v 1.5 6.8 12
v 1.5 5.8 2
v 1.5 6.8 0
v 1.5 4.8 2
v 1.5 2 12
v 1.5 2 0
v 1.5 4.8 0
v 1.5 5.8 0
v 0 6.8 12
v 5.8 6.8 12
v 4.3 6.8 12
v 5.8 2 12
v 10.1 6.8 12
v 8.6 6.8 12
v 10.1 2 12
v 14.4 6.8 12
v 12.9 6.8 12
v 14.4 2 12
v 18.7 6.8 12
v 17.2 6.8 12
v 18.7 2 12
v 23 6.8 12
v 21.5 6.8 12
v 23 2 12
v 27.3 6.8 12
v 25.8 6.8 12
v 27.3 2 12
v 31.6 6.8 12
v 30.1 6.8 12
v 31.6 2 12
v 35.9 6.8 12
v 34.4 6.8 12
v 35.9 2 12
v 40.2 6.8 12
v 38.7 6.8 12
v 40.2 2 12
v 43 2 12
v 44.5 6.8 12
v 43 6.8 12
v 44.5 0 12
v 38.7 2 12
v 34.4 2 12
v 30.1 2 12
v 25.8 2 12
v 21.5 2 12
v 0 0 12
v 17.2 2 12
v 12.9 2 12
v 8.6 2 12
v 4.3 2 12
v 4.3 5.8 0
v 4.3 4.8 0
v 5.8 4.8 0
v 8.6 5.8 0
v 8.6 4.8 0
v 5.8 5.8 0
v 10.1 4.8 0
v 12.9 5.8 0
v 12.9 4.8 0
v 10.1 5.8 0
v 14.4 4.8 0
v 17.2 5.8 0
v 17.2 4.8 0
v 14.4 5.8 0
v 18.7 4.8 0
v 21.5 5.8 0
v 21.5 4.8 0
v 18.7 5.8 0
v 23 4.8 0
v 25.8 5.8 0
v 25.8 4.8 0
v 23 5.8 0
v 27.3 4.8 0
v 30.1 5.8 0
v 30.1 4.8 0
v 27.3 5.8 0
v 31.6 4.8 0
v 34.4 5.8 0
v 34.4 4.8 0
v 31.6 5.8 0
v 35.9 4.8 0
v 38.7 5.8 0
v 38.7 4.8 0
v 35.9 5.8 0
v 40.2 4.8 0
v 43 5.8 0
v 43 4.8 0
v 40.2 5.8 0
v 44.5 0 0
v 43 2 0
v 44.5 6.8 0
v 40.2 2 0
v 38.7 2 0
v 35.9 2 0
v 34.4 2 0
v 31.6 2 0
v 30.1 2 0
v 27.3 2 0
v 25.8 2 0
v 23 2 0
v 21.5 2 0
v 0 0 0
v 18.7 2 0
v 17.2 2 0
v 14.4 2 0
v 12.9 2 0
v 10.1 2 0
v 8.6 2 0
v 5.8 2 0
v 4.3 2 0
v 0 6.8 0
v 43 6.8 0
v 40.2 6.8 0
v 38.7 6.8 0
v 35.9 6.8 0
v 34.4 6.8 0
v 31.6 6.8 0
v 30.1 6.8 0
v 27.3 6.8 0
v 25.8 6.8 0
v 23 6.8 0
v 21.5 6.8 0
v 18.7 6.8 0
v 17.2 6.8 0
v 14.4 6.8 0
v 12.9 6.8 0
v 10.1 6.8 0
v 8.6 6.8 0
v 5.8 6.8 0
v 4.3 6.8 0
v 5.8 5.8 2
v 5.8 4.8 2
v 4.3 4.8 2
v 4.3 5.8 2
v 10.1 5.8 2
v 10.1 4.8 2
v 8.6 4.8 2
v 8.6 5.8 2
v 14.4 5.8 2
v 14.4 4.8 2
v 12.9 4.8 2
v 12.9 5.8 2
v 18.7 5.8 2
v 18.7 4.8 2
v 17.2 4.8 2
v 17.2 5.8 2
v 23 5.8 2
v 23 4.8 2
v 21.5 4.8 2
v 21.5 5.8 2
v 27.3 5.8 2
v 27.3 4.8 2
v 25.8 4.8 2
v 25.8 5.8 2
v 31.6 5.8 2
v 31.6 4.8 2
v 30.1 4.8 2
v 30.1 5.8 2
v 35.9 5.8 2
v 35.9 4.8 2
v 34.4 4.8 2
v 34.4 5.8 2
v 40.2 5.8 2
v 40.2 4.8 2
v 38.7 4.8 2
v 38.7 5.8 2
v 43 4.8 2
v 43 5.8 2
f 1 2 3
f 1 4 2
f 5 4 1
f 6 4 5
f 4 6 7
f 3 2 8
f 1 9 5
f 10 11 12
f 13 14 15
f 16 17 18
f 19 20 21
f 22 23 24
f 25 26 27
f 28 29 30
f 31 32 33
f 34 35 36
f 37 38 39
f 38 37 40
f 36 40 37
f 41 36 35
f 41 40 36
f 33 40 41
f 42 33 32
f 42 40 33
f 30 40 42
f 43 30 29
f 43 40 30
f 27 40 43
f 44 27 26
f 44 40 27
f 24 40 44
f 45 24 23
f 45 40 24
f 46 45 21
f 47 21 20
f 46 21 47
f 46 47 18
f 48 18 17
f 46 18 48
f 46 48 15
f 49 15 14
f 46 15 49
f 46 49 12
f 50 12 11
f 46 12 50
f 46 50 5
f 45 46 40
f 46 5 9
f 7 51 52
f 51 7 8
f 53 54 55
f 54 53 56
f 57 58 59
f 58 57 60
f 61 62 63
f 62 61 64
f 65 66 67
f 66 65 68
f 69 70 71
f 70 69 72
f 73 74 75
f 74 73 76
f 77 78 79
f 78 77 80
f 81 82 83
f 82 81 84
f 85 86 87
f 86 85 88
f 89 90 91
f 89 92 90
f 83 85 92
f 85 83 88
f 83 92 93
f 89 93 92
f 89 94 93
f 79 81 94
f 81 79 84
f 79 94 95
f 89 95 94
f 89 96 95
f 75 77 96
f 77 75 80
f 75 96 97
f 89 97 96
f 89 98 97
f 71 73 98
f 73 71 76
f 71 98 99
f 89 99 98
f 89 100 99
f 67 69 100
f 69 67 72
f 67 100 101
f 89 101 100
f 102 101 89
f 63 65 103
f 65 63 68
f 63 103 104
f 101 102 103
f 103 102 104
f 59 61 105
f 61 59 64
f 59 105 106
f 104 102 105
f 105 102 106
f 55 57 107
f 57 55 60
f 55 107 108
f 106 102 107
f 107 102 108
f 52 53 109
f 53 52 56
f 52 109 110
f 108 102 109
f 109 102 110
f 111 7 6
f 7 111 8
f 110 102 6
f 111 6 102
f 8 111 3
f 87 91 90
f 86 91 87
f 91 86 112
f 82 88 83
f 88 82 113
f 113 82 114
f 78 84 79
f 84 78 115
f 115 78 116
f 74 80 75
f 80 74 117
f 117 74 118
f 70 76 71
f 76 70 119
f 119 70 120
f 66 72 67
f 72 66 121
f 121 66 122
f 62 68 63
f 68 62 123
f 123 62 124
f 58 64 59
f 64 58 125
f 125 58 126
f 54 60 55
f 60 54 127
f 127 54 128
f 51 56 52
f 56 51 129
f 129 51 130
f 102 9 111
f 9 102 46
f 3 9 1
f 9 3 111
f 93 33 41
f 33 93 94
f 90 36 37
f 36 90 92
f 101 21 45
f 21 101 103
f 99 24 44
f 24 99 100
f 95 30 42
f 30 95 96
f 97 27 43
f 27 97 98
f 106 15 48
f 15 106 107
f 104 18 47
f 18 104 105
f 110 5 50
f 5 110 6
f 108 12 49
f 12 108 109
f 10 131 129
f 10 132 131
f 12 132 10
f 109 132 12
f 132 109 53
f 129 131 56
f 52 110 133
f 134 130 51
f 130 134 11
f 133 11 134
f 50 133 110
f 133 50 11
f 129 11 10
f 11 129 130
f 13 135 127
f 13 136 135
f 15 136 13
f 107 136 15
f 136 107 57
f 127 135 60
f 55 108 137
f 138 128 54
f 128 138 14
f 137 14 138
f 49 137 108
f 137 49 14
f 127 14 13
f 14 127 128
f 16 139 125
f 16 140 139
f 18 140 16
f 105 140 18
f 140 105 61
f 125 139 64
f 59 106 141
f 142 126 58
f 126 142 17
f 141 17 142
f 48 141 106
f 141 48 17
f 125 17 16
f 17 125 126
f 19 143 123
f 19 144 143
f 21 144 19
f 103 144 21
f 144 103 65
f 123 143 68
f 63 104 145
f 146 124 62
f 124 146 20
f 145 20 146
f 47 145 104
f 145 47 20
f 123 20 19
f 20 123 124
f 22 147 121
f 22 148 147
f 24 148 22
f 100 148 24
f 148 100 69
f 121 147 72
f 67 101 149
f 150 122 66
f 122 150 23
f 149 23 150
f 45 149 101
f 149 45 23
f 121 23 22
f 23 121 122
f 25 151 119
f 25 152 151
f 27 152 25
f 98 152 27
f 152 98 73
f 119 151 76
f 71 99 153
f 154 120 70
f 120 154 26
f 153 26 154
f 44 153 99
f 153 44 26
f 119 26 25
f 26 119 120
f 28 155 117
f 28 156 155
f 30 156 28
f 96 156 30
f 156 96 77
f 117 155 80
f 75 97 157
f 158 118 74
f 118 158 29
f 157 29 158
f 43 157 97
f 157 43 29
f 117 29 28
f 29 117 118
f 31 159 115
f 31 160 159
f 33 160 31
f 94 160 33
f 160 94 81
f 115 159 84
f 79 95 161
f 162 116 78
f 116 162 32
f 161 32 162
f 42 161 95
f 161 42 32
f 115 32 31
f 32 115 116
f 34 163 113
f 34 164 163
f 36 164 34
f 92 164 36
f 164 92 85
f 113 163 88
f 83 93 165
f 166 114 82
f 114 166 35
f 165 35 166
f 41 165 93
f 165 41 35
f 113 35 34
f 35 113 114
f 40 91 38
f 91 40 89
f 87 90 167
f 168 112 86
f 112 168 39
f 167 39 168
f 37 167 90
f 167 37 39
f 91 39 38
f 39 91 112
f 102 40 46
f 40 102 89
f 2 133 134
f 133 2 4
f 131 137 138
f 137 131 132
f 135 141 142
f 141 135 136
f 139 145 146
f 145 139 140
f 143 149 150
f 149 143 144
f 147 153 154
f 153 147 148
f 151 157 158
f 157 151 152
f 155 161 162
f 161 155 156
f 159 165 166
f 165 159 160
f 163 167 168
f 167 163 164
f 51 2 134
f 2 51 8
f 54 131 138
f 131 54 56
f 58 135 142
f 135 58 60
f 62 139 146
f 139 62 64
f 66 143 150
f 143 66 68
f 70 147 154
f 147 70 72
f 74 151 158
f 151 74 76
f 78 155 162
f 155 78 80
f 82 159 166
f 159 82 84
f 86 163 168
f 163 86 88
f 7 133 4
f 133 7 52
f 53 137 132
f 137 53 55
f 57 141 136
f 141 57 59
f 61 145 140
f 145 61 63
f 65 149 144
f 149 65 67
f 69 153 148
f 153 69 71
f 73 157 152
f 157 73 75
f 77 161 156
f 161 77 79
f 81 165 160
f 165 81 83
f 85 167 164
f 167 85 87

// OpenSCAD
// --- Parameters ---
num_slots = 10;          // How many wires to hold
housing_width = 2.8;     // Standard is 2.54mm, we add a gap for fit
housing_depth = 2.8;     // Depth of the plastic connector
wall_thickness = 1.5;    // Thickness of the dividers
rail_height = 12;        // Height of the frame
back_thickness = 2;      // Thickness of the back plate

// --- Calculations ---
slot_pitch = housing_width + wall_thickness;
total_width = (slot_pitch * num_slots) + wall_thickness;

// --- The Model ---
union() {
    // 1. The Back Plate
    cube([total_width, back_thickness, rail_height]);

    // 2. The Teeth (Dividers)
    for (i = [0 : num_slots]) {
        translate([i * slot_pitch, back_thickness, 0])
            cube([wall_thickness, housing_depth + 2, rail_height]);
    }
    
    // 3. Optional: Front Lip (to keep wires from sliding out)
    translate([0, back_thickness + housing_depth, 0])
        cube([total_width, 1, 2]); 
}
